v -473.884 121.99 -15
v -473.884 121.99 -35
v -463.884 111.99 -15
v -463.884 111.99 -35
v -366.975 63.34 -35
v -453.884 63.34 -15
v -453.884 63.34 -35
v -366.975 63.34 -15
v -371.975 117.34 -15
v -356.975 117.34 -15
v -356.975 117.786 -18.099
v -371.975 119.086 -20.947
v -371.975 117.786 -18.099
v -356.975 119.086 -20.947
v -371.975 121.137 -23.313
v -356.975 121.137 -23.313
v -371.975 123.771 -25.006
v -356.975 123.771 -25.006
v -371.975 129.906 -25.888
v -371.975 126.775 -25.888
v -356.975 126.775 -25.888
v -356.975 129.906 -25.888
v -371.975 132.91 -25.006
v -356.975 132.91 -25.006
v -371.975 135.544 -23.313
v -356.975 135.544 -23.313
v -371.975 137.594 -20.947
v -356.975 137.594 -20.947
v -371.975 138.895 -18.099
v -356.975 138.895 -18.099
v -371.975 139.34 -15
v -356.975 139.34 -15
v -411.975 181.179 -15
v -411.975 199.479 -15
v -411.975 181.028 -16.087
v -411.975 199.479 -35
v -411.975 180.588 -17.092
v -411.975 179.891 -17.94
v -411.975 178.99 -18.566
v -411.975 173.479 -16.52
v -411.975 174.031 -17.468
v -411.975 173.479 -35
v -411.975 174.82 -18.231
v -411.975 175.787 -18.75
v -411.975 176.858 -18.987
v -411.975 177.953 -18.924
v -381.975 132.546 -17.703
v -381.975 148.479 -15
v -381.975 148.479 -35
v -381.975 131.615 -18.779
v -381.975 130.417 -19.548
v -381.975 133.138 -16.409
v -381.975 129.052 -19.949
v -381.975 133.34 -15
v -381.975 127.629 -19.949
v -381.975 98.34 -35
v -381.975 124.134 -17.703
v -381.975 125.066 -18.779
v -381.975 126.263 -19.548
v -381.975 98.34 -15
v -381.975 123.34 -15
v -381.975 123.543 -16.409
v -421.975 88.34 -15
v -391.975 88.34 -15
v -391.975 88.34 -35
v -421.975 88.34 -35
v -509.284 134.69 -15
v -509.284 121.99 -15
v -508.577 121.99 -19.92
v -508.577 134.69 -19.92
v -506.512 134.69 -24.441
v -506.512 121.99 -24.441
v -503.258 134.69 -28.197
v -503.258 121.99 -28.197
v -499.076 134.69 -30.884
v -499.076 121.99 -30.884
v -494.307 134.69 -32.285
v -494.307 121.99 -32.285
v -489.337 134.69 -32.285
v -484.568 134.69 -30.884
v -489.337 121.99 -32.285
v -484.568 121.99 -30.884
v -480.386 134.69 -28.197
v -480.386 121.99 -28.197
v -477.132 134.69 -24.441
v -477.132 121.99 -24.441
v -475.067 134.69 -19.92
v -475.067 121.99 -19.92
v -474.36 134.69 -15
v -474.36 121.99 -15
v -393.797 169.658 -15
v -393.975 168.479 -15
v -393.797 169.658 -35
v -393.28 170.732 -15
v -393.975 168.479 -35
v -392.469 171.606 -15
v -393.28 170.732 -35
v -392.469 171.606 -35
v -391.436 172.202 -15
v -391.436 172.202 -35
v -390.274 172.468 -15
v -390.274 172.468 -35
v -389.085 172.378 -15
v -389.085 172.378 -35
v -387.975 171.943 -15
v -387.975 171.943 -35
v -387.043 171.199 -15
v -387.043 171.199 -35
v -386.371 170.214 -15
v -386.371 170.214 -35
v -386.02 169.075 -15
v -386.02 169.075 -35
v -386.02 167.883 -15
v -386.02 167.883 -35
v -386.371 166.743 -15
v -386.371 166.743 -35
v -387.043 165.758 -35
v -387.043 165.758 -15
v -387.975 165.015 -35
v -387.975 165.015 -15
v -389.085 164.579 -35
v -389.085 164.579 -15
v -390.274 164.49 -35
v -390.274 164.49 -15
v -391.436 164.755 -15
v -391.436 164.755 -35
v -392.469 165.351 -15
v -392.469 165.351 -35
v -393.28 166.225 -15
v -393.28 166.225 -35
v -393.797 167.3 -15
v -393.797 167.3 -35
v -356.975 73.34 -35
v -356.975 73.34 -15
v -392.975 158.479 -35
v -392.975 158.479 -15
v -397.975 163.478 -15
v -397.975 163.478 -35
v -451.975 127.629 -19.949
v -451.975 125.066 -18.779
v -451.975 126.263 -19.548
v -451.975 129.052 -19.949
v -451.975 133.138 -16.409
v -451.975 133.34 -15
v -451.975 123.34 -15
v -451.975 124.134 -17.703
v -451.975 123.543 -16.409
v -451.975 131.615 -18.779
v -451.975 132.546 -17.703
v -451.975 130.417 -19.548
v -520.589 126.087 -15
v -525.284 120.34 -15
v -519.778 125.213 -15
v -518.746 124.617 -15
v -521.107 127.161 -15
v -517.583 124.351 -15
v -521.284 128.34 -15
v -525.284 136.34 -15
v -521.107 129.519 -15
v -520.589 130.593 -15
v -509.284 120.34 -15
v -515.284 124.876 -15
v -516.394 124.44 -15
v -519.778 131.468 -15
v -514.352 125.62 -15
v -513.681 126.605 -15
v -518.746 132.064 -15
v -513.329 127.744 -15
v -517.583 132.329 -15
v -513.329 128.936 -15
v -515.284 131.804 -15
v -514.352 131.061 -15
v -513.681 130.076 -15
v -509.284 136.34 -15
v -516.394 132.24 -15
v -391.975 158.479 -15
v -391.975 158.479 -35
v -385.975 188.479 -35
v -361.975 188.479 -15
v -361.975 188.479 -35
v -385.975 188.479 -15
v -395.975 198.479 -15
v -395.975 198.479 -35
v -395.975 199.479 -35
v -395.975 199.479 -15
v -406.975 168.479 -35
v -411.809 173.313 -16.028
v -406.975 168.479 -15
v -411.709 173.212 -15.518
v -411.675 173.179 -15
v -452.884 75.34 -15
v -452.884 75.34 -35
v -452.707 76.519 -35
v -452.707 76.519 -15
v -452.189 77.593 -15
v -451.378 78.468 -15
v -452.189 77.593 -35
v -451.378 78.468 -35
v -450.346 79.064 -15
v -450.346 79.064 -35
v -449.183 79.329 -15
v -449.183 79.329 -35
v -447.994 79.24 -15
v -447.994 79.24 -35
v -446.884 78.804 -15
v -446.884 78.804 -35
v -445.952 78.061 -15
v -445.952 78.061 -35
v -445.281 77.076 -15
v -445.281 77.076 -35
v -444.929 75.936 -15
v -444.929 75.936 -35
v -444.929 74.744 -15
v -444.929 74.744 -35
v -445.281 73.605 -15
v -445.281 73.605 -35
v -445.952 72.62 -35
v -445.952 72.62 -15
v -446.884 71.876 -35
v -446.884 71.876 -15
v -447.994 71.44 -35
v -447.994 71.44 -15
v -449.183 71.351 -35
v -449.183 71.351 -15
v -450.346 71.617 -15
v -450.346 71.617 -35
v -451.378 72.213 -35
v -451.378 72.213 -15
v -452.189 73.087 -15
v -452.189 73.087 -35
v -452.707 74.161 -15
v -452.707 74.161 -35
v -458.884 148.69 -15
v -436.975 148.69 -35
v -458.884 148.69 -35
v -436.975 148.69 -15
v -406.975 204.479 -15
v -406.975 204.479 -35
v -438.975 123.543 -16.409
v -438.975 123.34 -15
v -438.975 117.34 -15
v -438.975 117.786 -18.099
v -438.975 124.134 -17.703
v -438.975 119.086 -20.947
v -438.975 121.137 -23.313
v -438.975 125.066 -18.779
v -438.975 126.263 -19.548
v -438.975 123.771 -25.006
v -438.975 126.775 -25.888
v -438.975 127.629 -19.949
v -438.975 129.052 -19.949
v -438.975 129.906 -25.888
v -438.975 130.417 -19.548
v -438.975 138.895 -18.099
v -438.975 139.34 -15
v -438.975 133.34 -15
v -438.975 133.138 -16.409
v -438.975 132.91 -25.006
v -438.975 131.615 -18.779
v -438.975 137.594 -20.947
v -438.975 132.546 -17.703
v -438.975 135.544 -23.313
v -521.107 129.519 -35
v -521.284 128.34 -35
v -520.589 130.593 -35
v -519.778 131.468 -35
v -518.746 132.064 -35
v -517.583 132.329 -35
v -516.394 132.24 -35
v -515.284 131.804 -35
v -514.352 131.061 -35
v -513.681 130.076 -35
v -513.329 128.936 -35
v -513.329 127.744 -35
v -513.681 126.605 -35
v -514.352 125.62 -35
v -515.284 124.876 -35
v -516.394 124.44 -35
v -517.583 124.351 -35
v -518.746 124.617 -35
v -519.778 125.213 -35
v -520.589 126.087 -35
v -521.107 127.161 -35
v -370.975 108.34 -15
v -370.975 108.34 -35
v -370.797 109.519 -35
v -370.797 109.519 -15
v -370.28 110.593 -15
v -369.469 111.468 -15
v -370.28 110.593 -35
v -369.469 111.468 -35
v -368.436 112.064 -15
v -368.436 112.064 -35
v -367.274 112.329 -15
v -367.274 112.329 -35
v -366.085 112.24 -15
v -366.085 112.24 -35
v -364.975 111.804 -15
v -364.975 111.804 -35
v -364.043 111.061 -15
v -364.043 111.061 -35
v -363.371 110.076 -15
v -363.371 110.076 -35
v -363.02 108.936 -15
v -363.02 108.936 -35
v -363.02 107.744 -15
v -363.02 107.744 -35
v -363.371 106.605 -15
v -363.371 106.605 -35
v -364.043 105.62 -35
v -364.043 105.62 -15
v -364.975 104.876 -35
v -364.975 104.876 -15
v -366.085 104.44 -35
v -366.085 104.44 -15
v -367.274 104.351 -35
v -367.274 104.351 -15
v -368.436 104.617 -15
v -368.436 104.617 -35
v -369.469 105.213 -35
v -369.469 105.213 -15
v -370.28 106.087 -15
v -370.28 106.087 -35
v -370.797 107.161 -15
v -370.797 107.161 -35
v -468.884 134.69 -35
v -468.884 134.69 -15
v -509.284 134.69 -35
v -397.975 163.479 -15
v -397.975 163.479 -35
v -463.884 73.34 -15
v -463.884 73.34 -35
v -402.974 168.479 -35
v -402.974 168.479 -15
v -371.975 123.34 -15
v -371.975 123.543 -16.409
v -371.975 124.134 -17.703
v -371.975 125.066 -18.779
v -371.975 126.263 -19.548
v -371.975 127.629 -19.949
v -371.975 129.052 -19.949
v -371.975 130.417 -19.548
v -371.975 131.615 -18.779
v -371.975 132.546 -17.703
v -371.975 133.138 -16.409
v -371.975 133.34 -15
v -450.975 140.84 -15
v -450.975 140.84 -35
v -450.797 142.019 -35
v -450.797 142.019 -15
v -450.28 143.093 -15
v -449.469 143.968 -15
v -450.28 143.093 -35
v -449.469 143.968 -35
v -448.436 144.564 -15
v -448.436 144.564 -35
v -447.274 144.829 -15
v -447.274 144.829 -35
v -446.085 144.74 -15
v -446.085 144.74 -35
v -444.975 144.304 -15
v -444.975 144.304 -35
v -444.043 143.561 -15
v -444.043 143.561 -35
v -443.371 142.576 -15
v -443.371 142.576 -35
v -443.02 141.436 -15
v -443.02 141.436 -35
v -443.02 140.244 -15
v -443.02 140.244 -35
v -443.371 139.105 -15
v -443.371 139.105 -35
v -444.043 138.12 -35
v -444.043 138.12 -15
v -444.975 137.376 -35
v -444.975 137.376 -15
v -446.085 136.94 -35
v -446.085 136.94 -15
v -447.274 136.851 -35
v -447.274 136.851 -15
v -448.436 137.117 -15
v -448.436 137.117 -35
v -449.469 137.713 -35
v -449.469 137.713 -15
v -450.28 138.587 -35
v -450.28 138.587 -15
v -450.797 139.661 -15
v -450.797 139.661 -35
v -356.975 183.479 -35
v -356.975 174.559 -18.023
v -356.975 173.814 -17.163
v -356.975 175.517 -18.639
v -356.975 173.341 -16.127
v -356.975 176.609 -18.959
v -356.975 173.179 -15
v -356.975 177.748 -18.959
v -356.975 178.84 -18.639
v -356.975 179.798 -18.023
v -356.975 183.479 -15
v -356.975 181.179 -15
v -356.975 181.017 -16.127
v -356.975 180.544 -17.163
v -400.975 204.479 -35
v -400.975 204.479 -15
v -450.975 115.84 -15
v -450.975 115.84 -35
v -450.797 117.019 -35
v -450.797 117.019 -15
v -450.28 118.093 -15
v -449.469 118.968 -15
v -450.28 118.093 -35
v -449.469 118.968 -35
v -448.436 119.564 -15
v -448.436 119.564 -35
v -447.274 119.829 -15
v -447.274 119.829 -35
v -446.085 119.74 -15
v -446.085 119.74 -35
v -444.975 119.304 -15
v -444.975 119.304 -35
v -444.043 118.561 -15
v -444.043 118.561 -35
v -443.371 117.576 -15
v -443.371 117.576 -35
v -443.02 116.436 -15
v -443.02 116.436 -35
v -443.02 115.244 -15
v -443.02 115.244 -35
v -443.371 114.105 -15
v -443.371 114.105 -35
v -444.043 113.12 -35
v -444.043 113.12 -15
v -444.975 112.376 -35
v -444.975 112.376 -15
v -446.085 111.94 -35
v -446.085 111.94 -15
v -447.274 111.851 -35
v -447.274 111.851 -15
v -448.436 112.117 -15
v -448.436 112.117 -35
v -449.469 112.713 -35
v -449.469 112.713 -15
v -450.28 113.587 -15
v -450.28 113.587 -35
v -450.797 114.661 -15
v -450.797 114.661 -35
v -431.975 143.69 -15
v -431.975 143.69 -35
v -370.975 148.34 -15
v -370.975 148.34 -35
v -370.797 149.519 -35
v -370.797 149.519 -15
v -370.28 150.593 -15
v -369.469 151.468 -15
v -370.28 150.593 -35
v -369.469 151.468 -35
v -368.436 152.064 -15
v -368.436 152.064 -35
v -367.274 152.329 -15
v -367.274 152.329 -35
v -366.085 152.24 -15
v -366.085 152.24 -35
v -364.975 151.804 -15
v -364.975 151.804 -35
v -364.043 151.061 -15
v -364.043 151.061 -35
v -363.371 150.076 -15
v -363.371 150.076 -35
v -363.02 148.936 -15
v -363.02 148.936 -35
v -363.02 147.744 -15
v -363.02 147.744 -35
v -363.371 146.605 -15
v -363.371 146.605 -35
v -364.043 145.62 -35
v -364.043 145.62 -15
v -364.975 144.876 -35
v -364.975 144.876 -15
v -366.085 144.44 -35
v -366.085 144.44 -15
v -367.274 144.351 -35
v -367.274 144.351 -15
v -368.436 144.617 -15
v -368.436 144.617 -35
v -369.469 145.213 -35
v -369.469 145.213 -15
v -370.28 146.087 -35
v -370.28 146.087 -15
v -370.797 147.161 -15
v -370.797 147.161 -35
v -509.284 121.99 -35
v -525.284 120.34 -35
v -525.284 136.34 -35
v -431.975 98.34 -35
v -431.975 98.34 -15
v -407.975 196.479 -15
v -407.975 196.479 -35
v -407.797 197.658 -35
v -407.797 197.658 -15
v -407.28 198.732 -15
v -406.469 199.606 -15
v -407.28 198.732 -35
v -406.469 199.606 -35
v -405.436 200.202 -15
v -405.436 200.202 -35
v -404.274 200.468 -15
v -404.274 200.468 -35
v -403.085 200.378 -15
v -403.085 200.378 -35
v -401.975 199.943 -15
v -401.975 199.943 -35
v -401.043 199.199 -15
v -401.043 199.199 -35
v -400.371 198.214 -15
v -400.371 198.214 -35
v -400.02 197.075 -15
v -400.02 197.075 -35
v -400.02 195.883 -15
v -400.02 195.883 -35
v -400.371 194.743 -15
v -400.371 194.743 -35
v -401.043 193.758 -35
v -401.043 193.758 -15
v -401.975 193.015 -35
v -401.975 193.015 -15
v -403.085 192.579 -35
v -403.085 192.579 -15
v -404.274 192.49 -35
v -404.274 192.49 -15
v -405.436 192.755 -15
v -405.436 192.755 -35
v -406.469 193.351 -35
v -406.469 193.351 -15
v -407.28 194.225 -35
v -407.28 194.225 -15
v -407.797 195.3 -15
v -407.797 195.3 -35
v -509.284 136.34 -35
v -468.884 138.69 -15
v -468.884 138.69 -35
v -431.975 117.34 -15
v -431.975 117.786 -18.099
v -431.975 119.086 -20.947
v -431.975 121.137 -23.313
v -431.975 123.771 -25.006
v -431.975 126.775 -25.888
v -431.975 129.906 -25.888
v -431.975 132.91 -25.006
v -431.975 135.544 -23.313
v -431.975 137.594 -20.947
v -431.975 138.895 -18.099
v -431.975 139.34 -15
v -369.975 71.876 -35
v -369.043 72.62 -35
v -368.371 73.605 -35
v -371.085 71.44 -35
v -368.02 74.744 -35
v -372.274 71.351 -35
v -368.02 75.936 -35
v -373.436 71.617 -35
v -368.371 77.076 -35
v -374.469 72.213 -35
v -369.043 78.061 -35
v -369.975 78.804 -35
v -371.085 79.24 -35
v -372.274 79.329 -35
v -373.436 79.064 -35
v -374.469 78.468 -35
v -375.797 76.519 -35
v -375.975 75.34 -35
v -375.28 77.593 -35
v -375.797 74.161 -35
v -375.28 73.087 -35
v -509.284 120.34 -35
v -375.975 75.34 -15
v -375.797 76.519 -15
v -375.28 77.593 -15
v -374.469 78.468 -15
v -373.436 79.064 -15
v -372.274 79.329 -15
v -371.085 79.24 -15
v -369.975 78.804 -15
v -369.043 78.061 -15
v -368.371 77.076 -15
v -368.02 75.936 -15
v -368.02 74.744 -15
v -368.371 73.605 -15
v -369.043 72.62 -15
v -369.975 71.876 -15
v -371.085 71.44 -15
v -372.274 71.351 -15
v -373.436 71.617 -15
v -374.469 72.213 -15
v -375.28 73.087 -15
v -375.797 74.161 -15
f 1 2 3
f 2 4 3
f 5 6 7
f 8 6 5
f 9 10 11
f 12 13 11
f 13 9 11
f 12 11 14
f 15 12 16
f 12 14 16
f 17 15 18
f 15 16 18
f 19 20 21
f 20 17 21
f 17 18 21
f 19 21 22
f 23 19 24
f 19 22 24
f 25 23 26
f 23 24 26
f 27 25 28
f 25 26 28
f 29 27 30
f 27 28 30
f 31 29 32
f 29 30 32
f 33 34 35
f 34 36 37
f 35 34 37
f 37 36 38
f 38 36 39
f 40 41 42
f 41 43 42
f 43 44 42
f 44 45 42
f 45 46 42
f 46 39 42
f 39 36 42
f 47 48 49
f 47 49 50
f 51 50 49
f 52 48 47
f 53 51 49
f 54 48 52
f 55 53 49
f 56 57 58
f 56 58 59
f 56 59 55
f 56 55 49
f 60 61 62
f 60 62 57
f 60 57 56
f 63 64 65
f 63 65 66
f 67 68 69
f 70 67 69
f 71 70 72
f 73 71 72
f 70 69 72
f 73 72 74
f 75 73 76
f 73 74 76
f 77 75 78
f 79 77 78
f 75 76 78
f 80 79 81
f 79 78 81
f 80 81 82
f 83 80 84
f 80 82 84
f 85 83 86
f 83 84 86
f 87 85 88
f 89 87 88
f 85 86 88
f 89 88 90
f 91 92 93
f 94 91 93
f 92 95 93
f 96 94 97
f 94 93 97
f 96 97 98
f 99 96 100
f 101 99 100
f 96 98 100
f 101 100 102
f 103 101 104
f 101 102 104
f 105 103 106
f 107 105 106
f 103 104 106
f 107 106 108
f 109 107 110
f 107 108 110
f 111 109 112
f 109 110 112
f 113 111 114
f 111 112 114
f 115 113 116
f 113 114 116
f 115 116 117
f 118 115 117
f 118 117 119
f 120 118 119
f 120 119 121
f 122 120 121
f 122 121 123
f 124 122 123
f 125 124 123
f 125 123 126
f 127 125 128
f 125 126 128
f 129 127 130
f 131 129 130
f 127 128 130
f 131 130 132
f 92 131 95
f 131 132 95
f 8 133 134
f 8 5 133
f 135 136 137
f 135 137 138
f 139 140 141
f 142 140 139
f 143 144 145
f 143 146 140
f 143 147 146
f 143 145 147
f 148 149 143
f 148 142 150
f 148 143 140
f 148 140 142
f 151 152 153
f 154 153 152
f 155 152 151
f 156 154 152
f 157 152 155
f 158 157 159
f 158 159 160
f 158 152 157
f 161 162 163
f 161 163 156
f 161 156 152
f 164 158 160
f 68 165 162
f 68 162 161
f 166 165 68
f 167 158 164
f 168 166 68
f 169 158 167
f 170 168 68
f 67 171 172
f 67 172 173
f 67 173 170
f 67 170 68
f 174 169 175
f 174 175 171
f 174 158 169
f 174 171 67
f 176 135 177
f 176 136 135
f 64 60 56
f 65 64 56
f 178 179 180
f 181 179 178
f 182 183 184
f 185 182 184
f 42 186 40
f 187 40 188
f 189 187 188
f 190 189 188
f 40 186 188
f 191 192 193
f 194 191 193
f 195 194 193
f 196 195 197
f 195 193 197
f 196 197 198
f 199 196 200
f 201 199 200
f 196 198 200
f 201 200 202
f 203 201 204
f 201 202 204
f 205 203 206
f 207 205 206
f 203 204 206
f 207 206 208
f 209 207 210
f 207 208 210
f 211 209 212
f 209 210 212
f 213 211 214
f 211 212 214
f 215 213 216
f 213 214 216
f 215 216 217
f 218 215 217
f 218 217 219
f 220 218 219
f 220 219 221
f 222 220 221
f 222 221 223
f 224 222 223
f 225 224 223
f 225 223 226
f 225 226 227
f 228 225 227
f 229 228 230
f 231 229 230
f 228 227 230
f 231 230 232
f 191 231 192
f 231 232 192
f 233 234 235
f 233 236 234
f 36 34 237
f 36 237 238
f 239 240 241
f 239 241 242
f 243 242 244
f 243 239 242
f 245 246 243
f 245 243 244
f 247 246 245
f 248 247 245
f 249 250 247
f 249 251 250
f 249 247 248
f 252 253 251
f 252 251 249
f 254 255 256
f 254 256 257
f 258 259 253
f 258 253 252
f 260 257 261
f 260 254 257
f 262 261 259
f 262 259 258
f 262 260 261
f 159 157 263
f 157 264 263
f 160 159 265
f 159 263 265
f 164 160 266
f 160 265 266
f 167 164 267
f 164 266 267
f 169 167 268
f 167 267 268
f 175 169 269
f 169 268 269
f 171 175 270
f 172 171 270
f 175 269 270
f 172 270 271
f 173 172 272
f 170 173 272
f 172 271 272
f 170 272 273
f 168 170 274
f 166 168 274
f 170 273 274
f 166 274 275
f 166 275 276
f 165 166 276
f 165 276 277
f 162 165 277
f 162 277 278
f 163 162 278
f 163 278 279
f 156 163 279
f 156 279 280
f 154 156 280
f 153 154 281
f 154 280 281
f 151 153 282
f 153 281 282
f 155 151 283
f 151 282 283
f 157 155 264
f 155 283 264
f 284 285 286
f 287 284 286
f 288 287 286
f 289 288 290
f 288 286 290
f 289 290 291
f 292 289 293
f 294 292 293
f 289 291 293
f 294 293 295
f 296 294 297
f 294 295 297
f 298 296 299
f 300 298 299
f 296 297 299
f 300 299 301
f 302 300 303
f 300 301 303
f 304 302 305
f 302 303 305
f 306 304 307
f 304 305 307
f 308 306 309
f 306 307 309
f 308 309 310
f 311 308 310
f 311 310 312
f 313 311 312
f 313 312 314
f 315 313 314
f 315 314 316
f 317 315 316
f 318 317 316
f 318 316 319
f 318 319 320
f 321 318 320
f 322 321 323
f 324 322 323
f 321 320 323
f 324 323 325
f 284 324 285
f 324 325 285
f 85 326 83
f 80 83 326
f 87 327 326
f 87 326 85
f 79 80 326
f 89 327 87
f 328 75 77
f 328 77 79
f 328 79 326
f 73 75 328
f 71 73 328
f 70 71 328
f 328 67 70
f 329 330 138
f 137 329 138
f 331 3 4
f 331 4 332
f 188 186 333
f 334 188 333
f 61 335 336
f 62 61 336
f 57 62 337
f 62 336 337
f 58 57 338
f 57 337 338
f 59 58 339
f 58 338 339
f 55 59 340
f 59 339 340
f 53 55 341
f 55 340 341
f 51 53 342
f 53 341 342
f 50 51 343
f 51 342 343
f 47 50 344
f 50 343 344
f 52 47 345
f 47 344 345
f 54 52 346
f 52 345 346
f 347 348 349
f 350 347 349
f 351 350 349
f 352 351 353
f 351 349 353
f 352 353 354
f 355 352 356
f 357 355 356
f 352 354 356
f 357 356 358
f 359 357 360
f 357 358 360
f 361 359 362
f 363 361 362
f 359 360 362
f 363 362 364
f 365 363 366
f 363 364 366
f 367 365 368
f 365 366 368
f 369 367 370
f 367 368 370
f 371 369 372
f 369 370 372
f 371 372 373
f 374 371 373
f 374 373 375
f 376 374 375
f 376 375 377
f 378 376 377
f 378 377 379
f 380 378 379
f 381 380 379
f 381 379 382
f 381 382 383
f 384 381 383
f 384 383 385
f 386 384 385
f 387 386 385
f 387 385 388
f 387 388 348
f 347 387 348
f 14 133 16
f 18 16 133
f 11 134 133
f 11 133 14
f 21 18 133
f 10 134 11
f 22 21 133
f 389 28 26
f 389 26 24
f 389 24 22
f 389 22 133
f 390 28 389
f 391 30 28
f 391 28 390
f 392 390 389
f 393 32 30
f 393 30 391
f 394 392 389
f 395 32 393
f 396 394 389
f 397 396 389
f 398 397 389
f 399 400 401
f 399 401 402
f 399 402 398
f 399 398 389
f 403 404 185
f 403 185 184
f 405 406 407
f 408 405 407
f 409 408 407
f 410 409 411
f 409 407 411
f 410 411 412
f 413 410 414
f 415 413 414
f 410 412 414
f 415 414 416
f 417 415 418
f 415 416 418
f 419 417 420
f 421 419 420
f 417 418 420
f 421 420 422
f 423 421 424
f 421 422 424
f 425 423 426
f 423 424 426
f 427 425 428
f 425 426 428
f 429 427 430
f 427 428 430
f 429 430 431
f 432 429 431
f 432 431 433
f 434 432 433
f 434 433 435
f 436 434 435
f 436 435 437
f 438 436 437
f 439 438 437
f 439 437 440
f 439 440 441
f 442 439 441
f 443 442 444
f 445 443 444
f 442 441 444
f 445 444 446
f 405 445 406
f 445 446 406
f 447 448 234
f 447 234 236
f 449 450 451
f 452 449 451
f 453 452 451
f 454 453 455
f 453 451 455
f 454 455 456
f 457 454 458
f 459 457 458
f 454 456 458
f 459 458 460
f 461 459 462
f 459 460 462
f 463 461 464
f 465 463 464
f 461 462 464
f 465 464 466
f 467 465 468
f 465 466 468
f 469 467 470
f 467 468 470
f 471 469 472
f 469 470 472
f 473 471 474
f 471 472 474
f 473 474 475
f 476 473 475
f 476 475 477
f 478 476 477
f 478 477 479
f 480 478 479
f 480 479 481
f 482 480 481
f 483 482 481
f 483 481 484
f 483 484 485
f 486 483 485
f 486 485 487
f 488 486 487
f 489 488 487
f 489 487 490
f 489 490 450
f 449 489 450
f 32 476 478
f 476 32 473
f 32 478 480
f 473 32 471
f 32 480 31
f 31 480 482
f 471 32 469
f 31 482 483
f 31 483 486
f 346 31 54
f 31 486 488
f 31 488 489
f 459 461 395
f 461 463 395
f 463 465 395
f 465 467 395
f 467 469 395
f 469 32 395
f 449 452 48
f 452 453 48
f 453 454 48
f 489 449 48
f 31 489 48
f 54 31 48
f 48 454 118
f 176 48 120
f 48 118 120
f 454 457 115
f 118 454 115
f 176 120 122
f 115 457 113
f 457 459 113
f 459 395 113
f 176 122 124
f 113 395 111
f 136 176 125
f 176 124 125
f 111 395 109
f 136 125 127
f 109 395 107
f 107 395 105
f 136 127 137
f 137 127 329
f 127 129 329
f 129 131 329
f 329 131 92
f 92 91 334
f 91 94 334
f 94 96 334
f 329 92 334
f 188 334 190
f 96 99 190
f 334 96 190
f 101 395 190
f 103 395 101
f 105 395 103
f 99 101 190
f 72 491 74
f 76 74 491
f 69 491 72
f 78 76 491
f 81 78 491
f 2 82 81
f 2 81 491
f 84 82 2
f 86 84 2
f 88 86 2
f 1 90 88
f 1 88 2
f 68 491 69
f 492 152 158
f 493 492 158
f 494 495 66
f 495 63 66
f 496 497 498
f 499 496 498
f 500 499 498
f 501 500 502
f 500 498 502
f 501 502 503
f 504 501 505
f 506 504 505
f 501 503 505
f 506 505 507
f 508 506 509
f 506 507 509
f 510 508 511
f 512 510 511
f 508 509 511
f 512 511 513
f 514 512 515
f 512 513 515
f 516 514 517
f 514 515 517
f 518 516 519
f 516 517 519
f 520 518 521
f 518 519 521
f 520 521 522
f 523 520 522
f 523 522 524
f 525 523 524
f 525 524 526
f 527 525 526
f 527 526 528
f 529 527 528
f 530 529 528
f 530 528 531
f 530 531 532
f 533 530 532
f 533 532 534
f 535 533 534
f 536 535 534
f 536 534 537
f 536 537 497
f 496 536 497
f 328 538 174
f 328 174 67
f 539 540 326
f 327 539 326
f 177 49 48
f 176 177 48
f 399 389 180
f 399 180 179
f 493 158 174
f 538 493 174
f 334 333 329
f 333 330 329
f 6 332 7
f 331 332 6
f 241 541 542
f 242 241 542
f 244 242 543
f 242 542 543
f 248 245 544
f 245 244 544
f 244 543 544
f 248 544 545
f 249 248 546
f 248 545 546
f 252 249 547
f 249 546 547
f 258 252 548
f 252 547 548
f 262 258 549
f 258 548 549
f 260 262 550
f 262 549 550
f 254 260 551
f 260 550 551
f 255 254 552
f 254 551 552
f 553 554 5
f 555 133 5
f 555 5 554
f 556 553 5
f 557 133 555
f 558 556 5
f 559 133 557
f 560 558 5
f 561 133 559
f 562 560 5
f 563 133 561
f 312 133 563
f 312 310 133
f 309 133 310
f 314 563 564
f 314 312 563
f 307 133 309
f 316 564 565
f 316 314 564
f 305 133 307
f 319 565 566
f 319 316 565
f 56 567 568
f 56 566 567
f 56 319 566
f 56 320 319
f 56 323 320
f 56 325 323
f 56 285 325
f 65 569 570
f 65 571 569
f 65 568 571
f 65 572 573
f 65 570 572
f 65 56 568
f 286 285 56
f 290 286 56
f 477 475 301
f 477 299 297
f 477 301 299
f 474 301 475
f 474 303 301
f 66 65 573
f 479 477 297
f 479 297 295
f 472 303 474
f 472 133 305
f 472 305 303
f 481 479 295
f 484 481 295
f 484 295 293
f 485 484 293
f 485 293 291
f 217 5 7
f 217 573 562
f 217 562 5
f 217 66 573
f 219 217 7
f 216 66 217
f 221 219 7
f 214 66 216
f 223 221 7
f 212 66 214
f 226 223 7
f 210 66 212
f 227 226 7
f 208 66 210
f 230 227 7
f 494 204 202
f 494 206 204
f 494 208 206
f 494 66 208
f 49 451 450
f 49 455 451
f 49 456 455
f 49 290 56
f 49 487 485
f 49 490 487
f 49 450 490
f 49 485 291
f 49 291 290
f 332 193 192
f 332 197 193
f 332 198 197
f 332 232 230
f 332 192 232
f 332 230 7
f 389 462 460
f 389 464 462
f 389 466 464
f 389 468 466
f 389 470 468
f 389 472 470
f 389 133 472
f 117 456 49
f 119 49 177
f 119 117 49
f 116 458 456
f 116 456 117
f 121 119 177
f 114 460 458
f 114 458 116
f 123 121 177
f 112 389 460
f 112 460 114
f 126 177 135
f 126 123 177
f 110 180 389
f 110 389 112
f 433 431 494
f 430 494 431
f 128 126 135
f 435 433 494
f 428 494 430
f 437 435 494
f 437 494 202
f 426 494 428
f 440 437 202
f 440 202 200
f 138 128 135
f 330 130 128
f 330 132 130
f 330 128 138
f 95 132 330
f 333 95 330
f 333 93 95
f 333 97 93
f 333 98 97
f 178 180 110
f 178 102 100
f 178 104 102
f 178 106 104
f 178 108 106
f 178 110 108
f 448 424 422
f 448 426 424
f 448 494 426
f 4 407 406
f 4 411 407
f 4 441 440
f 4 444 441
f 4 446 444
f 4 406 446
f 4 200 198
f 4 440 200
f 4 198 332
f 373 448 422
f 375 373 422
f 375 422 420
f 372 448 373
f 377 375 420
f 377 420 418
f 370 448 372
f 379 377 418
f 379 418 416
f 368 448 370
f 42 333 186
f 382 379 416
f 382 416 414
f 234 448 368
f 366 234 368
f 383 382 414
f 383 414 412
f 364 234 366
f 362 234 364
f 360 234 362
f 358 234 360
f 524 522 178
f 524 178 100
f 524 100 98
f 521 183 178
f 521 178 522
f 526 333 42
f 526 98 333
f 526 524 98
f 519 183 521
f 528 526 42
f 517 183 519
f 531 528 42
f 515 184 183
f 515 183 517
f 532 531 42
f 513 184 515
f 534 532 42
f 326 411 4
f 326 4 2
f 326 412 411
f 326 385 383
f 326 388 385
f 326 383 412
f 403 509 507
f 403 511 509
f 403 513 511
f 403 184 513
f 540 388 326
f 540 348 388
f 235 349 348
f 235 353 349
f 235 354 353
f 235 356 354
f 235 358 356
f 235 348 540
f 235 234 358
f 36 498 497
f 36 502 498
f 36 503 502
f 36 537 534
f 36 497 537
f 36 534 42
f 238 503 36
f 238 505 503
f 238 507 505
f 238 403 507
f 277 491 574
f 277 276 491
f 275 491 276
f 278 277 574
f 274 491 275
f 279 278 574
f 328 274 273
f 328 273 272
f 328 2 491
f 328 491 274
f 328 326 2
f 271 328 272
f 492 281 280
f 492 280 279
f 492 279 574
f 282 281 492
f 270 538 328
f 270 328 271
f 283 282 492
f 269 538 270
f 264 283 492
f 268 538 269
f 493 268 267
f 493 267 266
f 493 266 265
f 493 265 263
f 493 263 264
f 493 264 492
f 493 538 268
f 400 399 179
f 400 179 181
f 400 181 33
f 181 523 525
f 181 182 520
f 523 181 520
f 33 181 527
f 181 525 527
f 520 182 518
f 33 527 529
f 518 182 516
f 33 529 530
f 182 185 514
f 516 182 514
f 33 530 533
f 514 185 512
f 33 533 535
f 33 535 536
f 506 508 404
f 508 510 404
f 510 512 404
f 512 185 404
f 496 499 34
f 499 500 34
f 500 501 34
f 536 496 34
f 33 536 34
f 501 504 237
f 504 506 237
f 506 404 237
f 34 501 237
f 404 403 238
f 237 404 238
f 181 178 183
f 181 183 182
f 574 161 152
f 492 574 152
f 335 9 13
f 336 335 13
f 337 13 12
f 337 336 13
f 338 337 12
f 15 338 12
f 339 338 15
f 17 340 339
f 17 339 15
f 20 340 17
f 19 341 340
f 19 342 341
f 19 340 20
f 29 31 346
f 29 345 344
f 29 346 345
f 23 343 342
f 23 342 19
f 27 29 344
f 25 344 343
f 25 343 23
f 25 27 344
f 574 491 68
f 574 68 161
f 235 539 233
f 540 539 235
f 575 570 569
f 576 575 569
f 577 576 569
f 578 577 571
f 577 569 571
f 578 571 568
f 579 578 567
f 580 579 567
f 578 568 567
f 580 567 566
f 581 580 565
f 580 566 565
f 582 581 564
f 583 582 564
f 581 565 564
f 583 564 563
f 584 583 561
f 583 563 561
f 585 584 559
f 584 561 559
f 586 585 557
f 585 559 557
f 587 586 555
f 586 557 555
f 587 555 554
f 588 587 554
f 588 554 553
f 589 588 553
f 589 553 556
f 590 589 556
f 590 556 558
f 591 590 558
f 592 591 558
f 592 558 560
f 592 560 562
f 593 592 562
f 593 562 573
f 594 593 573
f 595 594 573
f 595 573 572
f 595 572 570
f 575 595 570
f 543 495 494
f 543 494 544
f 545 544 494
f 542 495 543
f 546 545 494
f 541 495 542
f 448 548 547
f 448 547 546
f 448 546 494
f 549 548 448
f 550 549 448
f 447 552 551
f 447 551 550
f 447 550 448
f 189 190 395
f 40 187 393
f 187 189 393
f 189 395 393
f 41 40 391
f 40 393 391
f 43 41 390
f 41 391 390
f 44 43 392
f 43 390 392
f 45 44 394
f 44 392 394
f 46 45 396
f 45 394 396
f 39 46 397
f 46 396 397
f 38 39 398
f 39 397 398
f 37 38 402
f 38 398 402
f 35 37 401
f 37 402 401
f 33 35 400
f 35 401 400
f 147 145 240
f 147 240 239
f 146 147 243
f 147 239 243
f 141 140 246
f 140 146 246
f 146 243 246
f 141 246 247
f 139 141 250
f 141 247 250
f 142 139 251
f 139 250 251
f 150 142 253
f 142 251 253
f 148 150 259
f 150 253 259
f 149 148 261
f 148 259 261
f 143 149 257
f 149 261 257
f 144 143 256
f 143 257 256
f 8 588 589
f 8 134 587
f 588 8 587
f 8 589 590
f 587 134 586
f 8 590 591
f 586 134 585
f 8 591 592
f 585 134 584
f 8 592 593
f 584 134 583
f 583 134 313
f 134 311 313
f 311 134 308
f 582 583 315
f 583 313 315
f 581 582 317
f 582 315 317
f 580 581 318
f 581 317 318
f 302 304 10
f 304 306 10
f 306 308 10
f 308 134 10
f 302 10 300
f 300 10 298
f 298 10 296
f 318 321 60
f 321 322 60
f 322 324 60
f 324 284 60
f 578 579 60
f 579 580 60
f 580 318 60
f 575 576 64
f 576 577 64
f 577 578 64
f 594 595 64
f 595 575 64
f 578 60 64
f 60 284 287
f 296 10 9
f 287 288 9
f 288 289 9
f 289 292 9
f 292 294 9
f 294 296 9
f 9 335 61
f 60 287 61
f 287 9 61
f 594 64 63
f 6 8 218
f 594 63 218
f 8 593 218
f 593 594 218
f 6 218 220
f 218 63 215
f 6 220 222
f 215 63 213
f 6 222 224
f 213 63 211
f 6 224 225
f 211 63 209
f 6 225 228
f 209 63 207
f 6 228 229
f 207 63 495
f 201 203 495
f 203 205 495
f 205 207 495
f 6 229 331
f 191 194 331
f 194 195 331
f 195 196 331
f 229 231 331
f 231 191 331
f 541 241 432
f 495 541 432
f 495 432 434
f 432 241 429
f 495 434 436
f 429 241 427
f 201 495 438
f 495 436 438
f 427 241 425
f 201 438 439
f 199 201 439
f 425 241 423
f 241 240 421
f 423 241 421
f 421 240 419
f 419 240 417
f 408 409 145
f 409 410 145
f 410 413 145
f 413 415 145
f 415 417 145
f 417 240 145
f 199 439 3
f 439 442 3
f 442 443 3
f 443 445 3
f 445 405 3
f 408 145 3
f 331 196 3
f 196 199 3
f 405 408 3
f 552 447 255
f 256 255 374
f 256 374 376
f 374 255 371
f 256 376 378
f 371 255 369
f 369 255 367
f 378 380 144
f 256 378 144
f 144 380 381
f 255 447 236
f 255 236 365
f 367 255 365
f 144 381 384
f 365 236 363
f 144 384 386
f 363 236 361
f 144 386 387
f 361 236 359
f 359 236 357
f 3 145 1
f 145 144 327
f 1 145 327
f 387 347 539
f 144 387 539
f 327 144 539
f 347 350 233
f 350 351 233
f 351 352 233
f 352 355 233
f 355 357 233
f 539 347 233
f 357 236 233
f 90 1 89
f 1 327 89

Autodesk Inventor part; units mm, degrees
ref_plane "YZ Plane" through (0, 0, 0) normal (1, 0, 0) x (0, 1, 0)
ref_plane "XZ Plane" through (0, 0, 0) normal (0, 1, 0) x (-1, 0, 0)
ref_plane "XY Plane" through (0, 0, 0) normal (0, 0, 1) x (1, 0, 0)
ref_plane "Work Plane1" through (-191.4749, 128.3402, -15) normal (0, 0, -1) x (-1, 0, 0)
sketch "Sketch1" plane through (-191.4749, 128.3402, -15) normal (0, 0, -1) x (-1, 0, 0)
  line L0 (190.8, 9) -> (190.8, -9) construction
  line L1 (221.5, 38.1385) -> (221.5, 59.5385) construction
  line L2 (228.2, 37.8385) -> (228.2, 59.8385) construction
  line L3 (292.4096, 87.8385) -> (292.4096, -112.1615) construction
  line L4 (308.2846, 87.8385) -> (308.2846, -112.1615) construction
  line L5 (240.5, -40) -> (240.5, 20.35)
  line L6 (240.5, 20.35) -> (277.4096, 20.35)
  line L7 (277.4096, 20.35) -> (277.4096, 6.35)
  line L8 (277.4096, 6.35) -> (328.2846, 6.35)
  line L9 (328.2846, 6.35) -> (328.2846, -6.35)
  line L10 (328.2846, -6.35) -> (272.4096, -6.35)
  line L11 (272.4096, -6.35) -> (272.4096, -65)
  line L12 (272.4096, -65) -> (165.5, -65)
  line L13 (165.5, -65) -> (165.5, 60.1385)
  line L14 (165.5, 60.1385) -> (220.5, 60.1385)
  line L15 (220.5, 60.1385) -> (220.5, 40.1385)
  line L16 (220.5, 40.1385) -> (190.5, 40.1385)
  line L17 (190.5, 40.1385) -> (206.5, 40.1385)
  line L18 (206.5, 40.1385) -> (206.5, 30.1385)
  line L19 (206.5, 30.1385) -> (190.5, 30.1385)
  line L20 (190.5, 30.1385) -> (190.5, 40.1385)
  line L21 (190.5, 30.1385) -> (190.5, -40)
  line L22 (190.5, -40) -> (240.5, -40)
  line L23 (190.5, -8.7) -> (190.5, 8.7) construction
  point P0 (-191.4749, -128.3402)
  point P1 (328.2846, 0)
  point P2 (190.8, 0)
  point P3 (190.5, 0)
  dimension "d0" = 12.7
  dimension "d1" = 2
  dimension "d2" = 1
  dimension "d3" = 20
  dimension "d4" = 16
  dimension "d5" = 10
  dimension "d6" = 40
  dimension "d7" = 25
  dimension "d8" = 50
  dimension "d9" = 20
  dimension "d10" = 20
  dimension "d11" = 15
  dimension "d12" = 14
  dimension "d13" = 25
extrude "Extrusion1" add sketch "Sketch1" along normal blind 20
sketch "Sketch2" plane through (-519.7595, 121.9902, -15) normal (0, -1, 0) x (1, 0, 0)
  circle A0 centre (27.9375, 0) radius 30 construction
  circle A1 centre (27.9375, 0) radius 17.4625
  point P0 (519.7595, 15)
  dimension "d16" = 34.925
extrude "Extrusion2" cut sketch "Sketch2" against normal through all
sketch "Sketch3" plane through (-191.4749, 128.3402, -15) normal (0, 0, 1) x (1, 0, 0)
  line L0 (-317.8096, -6.35) -> (-317.8096, 6.35) projected
  line L1 (-333.8096, 8) -> (-317.8096, 8)
  line L2 (-317.8096, 8) -> (-317.8096, -8)
  line L3 (-317.8096, -8) -> (-333.8096, -8)
  line L4 (-333.8096, -8) -> (-333.8096, 8)
  point P0 (191.4749, -128.3402)
  point P1 (-317.8096, 0)
  dimension "d19" = 16
  dimension "d20" = 16
extrude "Extrusion3" add sketch "Sketch3" against normal up to surface (20 mm away)
sketch "Sketch4" plane through (-191.4749, 128.3402, -35) normal (0, 0, -1) x (-1, 0, 0)
  line L0 (317.8096, -8) -> (333.8096, -8) projected
  line L1 (333.8096, 8) -> (317.8096, 8) projected
  line L2 (325.8096, 8) -> (325.8096, -8)
  circle A0 centre (325.8096, 0) radius 4
  point P0 (-191.4749, -128.3402)
  dimension "d23" = 8
extrude "Extrusion4" cut sketch "Sketch4" against normal through all
sketch "Sketch5" plane through (-356.9749, 63.3402, -15) normal (1, 0, 0) x (0, 0, -1)
  arc A0 (1.3364, 96.1329) -> (-1.3364, 96.1329) centre (0, 65) ccw construction
  arc A1 (-1.3364, 96.1329) -> (-7.1127, 95.3389) centre (0, 65) ccw construction
  arc A2 (-7.1127, 95.3389) -> (-9.6864, 94.6178) centre (0, 65) ccw construction
  arc A3 (-9.6864, 94.6178) -> (-15.0343, 92.2949) centre (0, 65) ccw construction
  arc A4 (-15.0343, 92.2949) -> (-17.318, 90.9062) centre (0, 65) ccw construction
  arc A5 (-17.318, 90.9062) -> (-21.8409, 87.2265) centre (0, 65) ccw construction
  arc A6 (-21.8409, 87.2265) -> (-23.6652, 85.2731) centre (0, 65) ccw construction
  arc A7 (-23.6652, 85.2731) -> (-27.0276, 80.5097) centre (0, 65) ccw construction
  arc A8 (-27.0276, 80.5097) -> (-28.2572, 78.1366) centre (0, 65) ccw construction
  arc A9 (-28.2572, 78.1366) -> (-30.2098, 72.6426) centre (0, 65) ccw construction
  arc A10 (-30.2098, 72.6426) -> (-30.7536, 70.0257) centre (0, 65) ccw construction
  arc A11 (-30.7536, 70.0257) -> (-31.1515, 64.2087) centre (0, 65) ccw construction
  arc A12 (-31.1515, 64.2087) -> (-30.9691, 61.5421) centre (0, 65) ccw construction
  arc A13 (-30.9691, 61.5421) -> (-29.7828, 55.8335) centre (0, 65) ccw construction
  arc A14 (-29.7828, 55.8335) -> (-28.8878, 53.315) centre (0, 65) ccw construction
  arc A15 (-28.8878, 53.315) -> (-26.2053, 48.1381) centre (0, 65) ccw construction
  arc A16 (-26.2053, 48.1381) -> (-24.6639, 45.9545) centre (0, 65) ccw construction
  arc A17 (-24.6639, 45.9545) -> (-20.6842, 41.6933) centre (0, 65) ccw construction
  arc A18 (-20.6842, 41.6933) -> (-18.6109, 40.0065) centre (0, 65) ccw construction
  arc A19 (-18.6109, 40.0065) -> (-13.6291, 36.977) centre (0, 65) ccw construction
  arc A20 (-13.6291, 36.977) -> (-11.1776, 35.9122) centre (0, 65) ccw construction
  arc A21 (-11.1776, 35.9122) -> (-5.5632, 34.3391) centre (0, 65) ccw construction
  arc A22 (-5.5632, 34.3391) -> (-2.9153, 33.9751) centre (0, 65) ccw construction
  arc A23 (-2.9153, 33.9751) -> (2.9153, 33.9751) centre (0, 65) ccw construction
  arc A24 (2.9153, 33.9751) -> (5.5632, 34.3391) centre (0, 65) ccw construction
  arc A25 (5.5632, 34.3391) -> (11.1776, 35.9122) centre (0, 65) ccw construction
  arc A26 (11.1776, 35.9122) -> (13.6291, 36.977) centre (0, 65) ccw construction
  arc A27 (13.6291, 36.977) -> (18.6109, 40.0065) centre (0, 65) ccw construction
  arc A28 (18.6109, 40.0065) -> (20.6842, 41.6933) centre (0, 65) ccw construction
  arc A29 (20.6842, 41.6933) -> (24.6639, 45.9545) centre (0, 65) ccw construction
  arc A30 (24.6639, 45.9545) -> (26.2053, 48.1381) centre (0, 65) ccw construction
  arc A31 (26.2053, 48.1381) -> (28.8878, 53.315) centre (0, 65) ccw construction
  arc A32 (28.8878, 53.315) -> (29.7828, 55.8335) centre (0, 65) ccw construction
  arc A33 (29.7828, 55.8335) -> (30.9691, 61.5421) centre (0, 65) ccw construction
  arc A34 (30.9691, 61.5421) -> (31.1515, 64.2087) centre (0, 65) ccw construction
  arc A35 (31.1515, 64.2087) -> (30.7536, 70.0257) centre (0, 65) ccw construction
  arc A36 (30.7536, 70.0257) -> (30.2098, 72.6426) centre (0, 65) ccw construction
  arc A37 (30.2098, 72.6426) -> (28.2572, 78.1366) centre (0, 65) ccw construction
  arc A38 (28.2572, 78.1366) -> (27.0276, 80.5097) centre (0, 65) ccw construction
  arc A39 (27.0276, 80.5097) -> (23.6652, 85.2731) centre (0, 65) ccw construction
  arc A40 (23.6652, 85.2731) -> (21.8409, 87.2265) centre (0, 65) ccw construction
  arc A41 (21.8409, 87.2265) -> (17.318, 90.9062) centre (0, 65) ccw construction
  arc A42 (17.318, 90.9062) -> (15.0343, 92.2949) centre (0, 65) ccw construction
  arc A43 (15.0343, 92.2949) -> (9.6864, 94.6178) centre (0, 65) ccw construction
  arc A44 (9.6864, 94.6178) -> (7.1127, 95.3389) centre (0, 65) ccw construction
  arc A45 (7.1127, 95.3389) -> (1.3364, 96.1329) centre (0, 65) ccw construction
  circle A46 centre (-10, 65) radius 3 construction
  arc A47 (7, 65) -> (-7, 65) centre (0, 65) ccw construction
  circle A48 centre (10, 65) radius 3 construction
  arc A49 (-7, 65) -> (7, 65) centre (0, 65) ccw construction
  circle A50 centre (0, 65) radius 5
  point P0 (-15, -63.3402)
  dimension "d26" = 10
extrude "Extrusion5" cut sketch "Sketch5" against normal blind 95
sketch "Sketch6" plane through (-431.9749, 88.3402, -35) normal (1, 0, 0) x (0, 0, -1)
  arc A0 (-20, 35) -> (-20, 45) centre (-20, 40) ccw projected
  circle A1 centre (-20, 40) radius 11
  point P0 (-35, -88.3402)
  dimension "d29" = 22
extrude "Extrusion6" cut sketch "Sketch6" against normal blind 7
sketch "Sketch7" plane through (-356.9749, 63.3402, -35) normal (1, 0, 0) x (0, 0, -1)
  arc A0 (-20, 60) -> (-20, 70) centre (-20, 65) ccw projected
  circle A1 centre (-20, 65) radius 11
  point P0 (-35, -63.3402)
  dimension "d32" = 22
extrude "Extrusion7" cut sketch "Sketch7" against normal blind 15
sketch "Sketch8" plane through (-191.4749, 128.3402, -35) normal (0, 0, -1) x (-1, 0, 0)
  line L0 (220.5, 60.1385) -> (204.5, 60.1385)
  line L1 (204.5, 60.1385) -> (204.5, 76.1385)
  line L2 (204.5, 76.1385) -> (220.5, 76.1385)
  line L3 (220.5, 76.1385) -> (220.5, 60.1385)
  point P0 (-191.4749, -128.3402)
  dimension "d35" = 16
  dimension "d36" = 16
extrude "Extrusion8" add sketch "Sketch8" against normal up to surface (20 mm away)
sketch "Sketch9" plane through (-356.9749, 63.3402, -35) normal (1, 0, 0) x (0, 0, -1)
  circle A0 centre (-20, 113.8385) radius 10.7 projected
  circle A1 centre (-20, 113.8385) radius 10.7 projected
  circle A2 centre (-20, 113.8385) radius 4
  point P0 (-35, -63.3402)
  dimension "d39" = 8
extrude "Extrusion9" cut sketch "Sketch9" against normal through all contours A2
sketch "Sketch10" plane through (-191.4749, 128.3402, -35) normal (0, 0, -1) x (-1, 0, 0)
  line L0 (277.4096, 6.35) -> (277.4096, 20.35) projected
  line L1 (190.5, 30.1385) -> (206.5, 30.1385) projected
  line L2 (220.5, 40.1385) -> (220.5, 76.1385) projected
  line L3 (204.5, 76.1385) -> (204.5, 60.1385) projected
  line L4 (165.5, 60.1385) -> (165.5, -65) projected
  line L5 (165.5, -65) -> (272.4096, -65) projected
  line L6 (204.5, 68.1385) -> (220.5, 68.1385) construction
  line L7 (198.5, 30.1385) -> (198.5, 40.1385) construction
  line L8 (198.5, 40.1385) -> (206.5, 40.1385) construction
  circle A0 centre (198.5, 40.1385) radius 4
  circle A1 centre (212.5, 68.1385) radius 4
  line L9 (247.5, 11) -> (240.5, 11) construction
  line L10 (240.5, -11) -> (247.5, -11) construction
  line L11 (247.5, 11) -> (247.5, -11) construction
  line L12 (282.8846, 6.35) -> (282.8846, -6.35) construction
  line L13 (247.5, 0) -> (255.5, 0) construction
  line L14 (255.5, 12.5) -> (255.5, -12.5) construction
  line L15 (260.5, 5) -> (247.5, 5) construction
  line L16 (247.5, -5) -> (260.5, -5) construction
  circle A2 centre (255.5, 12.5) radius 4
  circle A3 centre (255.5, -12.5) radius 4
  line L17 (180.5, -53) -> (257.4096, -53) construction
  circle A4 centre (180.5, -53) radius 4
  circle A5 centre (257.4096, -53) radius 4
  line L18 (272.4096, -65) -> (272.4096, -6.35) projected
  line L19 (180.5, -5) -> (190.5, -5) construction
  line L20 (190.5, 5) -> (180.5, 5) construction
  line L21 (180.5, 11) -> (165.5, 11) construction
  line L22 (165.5, -11) -> (180.5, -11) construction
  line L23 (175.5, 20) -> (175.5, -20) construction
  circle A6 centre (175.5, 20) radius 4
  circle A7 centre (175.5, -20) radius 4
  line L24 (165.5, -11) -> (165.5, 11) projected
  point P0 (-191.4749, -128.3402)
  point P1 (175.5, 0)
  point P2 (165.5, 0)
  dimension "d42" = 8
  dimension "d43" = 8
  dimension "d46" = 8
  dimension "d47" = 25
  dimension "d48" = 8
  dimension "d49" = 8
  dimension "d50" = 12
  dimension "d51" = 15
  dimension "d52" = 15
  dimension "d53" = 8
  dimension "d54" = 40
  dimension "d55" = 10
extrude "Extrusion10" cut sketch "Sketch10" against normal through all
chamfer "Chamfer1" distance 5 angle 45 2 edges at (-397.9749, 168.4787, -25) (-397.9749, 158.4787, -25)
chamfer "Chamfer2" distance 10 angle 45 2 edges at (-395.9749, 188.4787, -25) (-381.9749, 158.4787, -25)
chamfer "Chamfer3" distance 5 angle 45 3 edges at (-395.9749, 204.4787, -25) (-411.9749, 204.4787, -25) (-411.9749, 168.4787, -25)
chamfer "Chamfer4" distance 5 angle 45 1 edges at (-356.9749, 188.4787, -25)
chamfer "Chamfer5" distance 10 angle 45 2 edges at (-356.9749, 63.3402, -25) (-463.8845, 63.3402, -25)
chamfer "Chamfer6" distance 10 angle 45 2 edges at (-381.9749, 88.3402, -25) (-431.9749, 88.3402, -25)
chamfer "Chamfer7" distance 10 angle 45 2 edges at (-468.8845, 148.6902, -25) (-463.8845, 121.9902, -25)
chamfer "Chamfer8" distance 5 angle 45 1 edges at (-431.9749, 148.6902, -25)
properties part number "gear frame 1"
